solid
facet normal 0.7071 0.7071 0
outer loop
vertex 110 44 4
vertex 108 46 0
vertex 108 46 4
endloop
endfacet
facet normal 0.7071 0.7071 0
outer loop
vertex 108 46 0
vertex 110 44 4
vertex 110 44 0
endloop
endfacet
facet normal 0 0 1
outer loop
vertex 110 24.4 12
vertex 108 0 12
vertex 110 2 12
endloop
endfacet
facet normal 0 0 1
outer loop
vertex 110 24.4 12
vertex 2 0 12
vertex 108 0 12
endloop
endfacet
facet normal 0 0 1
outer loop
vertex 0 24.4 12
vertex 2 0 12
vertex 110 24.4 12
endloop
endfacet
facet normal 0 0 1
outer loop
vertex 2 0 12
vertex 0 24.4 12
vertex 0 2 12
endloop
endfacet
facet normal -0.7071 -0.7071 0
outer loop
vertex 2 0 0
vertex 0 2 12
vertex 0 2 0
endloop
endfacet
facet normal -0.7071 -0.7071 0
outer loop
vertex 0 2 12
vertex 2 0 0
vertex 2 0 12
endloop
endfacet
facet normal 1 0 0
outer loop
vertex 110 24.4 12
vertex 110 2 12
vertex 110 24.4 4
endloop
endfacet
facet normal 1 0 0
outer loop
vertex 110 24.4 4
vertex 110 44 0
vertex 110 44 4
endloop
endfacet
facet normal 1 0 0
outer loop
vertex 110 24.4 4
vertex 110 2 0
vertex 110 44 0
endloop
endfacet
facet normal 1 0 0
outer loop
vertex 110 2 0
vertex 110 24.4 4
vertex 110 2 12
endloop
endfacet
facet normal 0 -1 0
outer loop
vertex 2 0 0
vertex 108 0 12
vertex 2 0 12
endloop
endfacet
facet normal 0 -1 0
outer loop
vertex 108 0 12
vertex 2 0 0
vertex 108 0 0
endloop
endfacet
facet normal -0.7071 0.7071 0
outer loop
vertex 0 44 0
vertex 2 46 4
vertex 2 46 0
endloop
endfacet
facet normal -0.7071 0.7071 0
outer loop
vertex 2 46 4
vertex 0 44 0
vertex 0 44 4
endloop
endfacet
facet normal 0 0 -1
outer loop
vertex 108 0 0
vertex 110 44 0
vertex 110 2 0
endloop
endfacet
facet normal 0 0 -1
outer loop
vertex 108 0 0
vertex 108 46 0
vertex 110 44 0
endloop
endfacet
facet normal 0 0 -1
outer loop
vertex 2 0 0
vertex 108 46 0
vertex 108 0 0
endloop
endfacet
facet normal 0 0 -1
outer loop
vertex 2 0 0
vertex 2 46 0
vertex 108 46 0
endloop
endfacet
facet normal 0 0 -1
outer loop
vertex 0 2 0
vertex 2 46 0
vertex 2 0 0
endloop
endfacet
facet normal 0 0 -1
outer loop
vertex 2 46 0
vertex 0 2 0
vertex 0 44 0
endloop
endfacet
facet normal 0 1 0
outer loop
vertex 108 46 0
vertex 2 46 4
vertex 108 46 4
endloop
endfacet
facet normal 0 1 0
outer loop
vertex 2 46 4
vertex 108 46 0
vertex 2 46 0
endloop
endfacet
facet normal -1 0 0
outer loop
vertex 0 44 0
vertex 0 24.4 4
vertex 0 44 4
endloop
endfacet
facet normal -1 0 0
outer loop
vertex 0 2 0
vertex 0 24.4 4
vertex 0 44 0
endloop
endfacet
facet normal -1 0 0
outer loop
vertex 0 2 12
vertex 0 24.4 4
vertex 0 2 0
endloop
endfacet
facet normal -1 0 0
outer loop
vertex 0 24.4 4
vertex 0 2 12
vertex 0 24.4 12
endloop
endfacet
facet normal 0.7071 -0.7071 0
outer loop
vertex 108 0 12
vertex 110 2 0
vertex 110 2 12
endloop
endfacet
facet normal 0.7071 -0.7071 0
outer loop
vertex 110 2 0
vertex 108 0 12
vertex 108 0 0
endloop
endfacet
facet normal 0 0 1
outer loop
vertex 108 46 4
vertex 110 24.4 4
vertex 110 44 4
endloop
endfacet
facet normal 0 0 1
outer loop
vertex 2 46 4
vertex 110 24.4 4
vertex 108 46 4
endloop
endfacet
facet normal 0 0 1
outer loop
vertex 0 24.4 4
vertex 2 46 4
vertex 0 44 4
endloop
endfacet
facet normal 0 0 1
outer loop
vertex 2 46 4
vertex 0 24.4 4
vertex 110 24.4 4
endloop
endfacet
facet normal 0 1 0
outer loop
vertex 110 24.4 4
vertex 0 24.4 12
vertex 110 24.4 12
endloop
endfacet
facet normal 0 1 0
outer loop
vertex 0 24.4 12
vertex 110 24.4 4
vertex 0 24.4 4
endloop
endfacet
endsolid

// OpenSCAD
$fn = 32;

// ----------------------------------------------------------------------
// Stepped bar: sidestep, 110 x 46 x 12/4 mm
// ----------------------------------------------------------------------

// --- parameters (mm) ---
bar_l = 110;              // bar length, X
bar_w = 46;               // bar width, Y
plate_t = 12;             // thickness of the thick zone, Z
thin_t = 4;               // thickness of the thin zone
corner_c = 2;             // corner chamfer of the bar
step_cut = 8;             // material removed from the thin zone
ledge_y = 24.4;           // start of the ledge from the front edge
depth_1 = 8;              // depth of cut 1 from the top face

profile = [[2, 0], [108, 0], [110, 2], [110, 44], [108, 46], [2, 46], [0, 44], [0, 2]];  // primary outline, 8 points, counter clockwise
void_1 = [[-1, 24.4], [111, 24.4], [111, 47], [-1, 47]];  // ledge cut along one edge, 4 points

// --- the one profile operation ---
difference() {
  linear_extrude(height = plate_t) polygon(points = profile);
  translate([0, 0, plate_t - depth_1])
    linear_extrude(height = depth_1 + 1) polygon(points = void_1);
}
